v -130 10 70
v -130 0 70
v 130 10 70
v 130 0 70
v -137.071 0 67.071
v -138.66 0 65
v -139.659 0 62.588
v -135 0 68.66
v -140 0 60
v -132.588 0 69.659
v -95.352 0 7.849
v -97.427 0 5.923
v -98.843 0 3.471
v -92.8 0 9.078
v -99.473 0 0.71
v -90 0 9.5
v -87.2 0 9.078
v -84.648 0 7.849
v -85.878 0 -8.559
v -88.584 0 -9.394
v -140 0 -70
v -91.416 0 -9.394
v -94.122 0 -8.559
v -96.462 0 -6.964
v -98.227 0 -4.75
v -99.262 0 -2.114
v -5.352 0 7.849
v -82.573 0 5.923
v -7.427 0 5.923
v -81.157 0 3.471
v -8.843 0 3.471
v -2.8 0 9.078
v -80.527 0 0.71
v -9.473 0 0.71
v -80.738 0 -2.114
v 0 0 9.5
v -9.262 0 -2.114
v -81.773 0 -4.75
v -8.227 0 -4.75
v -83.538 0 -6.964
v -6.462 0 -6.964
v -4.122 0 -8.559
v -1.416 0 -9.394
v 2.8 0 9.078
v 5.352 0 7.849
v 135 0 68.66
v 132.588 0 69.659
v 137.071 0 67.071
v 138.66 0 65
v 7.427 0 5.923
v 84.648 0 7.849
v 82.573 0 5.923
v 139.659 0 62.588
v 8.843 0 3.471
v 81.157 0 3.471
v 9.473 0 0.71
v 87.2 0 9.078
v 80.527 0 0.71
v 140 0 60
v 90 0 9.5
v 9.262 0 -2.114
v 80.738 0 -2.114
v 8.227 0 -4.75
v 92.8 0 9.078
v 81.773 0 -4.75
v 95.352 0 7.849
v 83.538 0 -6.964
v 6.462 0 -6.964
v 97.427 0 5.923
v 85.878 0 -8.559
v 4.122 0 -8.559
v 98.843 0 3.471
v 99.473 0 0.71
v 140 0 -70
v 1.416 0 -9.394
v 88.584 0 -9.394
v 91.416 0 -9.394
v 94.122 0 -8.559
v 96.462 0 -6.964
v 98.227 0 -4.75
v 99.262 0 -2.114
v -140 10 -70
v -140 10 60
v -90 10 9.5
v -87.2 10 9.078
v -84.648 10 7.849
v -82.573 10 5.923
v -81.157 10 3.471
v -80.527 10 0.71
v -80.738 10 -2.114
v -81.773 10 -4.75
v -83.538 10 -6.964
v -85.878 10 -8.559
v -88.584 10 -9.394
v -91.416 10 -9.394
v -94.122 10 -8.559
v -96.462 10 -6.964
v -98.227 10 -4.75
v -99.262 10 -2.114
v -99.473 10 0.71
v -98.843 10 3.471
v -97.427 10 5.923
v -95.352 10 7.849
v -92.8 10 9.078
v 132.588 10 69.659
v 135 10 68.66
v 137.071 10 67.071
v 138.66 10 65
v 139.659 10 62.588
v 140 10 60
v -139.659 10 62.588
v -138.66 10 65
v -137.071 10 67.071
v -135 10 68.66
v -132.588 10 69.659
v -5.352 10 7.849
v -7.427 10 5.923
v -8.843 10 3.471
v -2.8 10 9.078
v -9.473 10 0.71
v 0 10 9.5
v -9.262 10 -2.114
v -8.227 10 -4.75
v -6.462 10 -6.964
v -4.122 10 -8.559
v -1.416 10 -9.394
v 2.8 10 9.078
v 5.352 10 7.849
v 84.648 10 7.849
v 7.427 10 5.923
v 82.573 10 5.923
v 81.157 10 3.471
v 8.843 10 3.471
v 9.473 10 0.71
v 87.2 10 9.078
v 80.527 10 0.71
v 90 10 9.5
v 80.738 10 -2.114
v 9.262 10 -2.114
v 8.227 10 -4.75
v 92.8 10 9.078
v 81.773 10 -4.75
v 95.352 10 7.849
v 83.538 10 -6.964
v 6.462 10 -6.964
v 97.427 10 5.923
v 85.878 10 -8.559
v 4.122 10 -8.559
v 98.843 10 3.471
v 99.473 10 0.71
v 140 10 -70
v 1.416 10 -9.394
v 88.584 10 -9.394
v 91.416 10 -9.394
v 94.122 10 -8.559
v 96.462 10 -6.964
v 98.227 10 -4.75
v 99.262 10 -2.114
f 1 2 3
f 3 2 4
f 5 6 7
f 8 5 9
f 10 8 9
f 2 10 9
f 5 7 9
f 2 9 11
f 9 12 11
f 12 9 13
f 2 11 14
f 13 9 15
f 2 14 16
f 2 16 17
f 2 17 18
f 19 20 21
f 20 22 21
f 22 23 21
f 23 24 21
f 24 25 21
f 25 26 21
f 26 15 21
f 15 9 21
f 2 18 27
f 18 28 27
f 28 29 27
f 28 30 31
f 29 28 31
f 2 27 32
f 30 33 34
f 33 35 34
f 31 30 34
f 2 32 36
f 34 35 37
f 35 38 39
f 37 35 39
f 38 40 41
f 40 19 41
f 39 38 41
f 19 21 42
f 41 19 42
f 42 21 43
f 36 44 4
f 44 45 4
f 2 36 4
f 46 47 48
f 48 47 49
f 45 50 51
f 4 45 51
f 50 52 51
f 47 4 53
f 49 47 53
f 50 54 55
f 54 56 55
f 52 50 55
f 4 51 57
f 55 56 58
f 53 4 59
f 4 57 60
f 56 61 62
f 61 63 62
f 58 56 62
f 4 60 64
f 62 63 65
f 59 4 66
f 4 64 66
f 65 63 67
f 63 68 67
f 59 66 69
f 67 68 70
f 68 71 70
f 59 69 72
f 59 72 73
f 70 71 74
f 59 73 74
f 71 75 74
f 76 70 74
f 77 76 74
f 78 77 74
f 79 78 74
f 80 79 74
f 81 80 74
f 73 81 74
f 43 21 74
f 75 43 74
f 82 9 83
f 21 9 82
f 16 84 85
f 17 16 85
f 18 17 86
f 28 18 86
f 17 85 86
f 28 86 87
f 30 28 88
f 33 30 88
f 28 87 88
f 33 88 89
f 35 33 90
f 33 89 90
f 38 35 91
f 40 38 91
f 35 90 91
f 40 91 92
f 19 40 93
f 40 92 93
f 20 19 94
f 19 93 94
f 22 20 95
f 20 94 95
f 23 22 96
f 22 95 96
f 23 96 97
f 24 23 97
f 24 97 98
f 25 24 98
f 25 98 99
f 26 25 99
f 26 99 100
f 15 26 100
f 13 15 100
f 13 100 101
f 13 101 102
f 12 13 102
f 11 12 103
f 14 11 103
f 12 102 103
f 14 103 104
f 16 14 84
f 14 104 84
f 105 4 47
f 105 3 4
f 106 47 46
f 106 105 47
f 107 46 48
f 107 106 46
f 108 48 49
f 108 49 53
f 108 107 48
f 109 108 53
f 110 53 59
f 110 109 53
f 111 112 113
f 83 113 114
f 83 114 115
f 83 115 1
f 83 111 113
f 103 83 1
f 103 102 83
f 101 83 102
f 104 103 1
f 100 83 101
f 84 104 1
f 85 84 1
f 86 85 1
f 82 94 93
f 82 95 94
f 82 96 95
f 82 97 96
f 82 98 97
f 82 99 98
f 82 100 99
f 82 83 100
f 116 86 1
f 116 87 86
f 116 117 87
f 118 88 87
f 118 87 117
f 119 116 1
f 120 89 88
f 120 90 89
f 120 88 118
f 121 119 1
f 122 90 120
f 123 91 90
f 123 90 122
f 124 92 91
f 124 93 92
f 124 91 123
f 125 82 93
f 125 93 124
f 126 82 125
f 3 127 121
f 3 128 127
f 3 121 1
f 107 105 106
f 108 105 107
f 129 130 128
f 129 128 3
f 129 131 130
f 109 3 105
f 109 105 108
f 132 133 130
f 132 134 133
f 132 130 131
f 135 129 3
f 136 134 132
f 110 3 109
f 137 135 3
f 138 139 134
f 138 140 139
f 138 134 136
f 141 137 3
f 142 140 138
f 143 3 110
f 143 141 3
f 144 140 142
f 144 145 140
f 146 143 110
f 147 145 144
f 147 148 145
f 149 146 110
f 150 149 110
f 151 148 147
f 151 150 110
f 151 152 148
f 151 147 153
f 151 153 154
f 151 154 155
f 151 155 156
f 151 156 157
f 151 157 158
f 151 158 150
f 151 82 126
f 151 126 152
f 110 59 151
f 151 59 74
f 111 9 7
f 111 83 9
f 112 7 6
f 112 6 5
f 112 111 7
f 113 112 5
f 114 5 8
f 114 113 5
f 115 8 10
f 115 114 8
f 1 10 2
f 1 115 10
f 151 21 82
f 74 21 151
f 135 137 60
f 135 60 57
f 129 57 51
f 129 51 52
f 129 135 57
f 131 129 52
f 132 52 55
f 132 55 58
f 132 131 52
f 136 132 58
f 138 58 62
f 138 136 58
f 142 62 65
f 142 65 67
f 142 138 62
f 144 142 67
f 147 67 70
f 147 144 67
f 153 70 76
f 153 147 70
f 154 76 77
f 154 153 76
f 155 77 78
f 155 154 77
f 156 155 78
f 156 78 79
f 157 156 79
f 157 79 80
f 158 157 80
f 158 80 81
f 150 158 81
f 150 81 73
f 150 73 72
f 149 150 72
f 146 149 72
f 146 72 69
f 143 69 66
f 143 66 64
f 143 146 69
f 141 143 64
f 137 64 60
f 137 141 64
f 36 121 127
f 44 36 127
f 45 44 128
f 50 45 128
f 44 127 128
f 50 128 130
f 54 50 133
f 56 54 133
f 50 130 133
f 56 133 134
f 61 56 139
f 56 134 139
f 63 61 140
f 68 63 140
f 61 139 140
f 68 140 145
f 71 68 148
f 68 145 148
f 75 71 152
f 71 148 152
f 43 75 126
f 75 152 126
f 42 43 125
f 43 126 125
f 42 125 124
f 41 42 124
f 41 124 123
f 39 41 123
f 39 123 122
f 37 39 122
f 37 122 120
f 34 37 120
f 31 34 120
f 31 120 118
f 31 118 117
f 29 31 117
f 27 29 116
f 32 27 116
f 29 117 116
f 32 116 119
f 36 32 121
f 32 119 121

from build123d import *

# Parameters (mm, degrees)
SKETCH1_W           = 280
SKETCH1_H           = 140
BOSS_EXTRUDE1_DEPTH = 10
SKETCH2_R           = 9.5
CUT_EXTRUDE1_DEPTH  = 10
FILLET1_R           = 10


with BuildPart() as part:
    # Sketch1 → Boss-Extrude1 (new body)
    with BuildSketch(Plane(origin=(0, 0, 0), x_dir=(1, 0, 0), z_dir=(0, 1, 0))):
        Rectangle(SKETCH1_W, SKETCH1_H)
    extrude(amount=BOSS_EXTRUDE1_DEPTH)

    # Sketch2 → Cut-Extrude1 (cut)
    with BuildSketch(Plane(origin=(0, 10, 0), x_dir=(1, 0, 0), z_dir=(0, 1, 0))):
        with Locations(Location((-90, 0, 0), (0, 0, 270))):
            Circle(SKETCH2_R)
        with Locations(Location((0, 0, 0), (0, 0, 270))):
            Circle(SKETCH2_R)
    cut_extrude1 = extrude(amount=-CUT_EXTRUDE1_DEPTH, mode=Mode.SUBTRACT)

    # Mirror1: Cut-Extrude1 across plane
    add(cut_extrude1.mirror(Plane(origin=(0, 0, 0), x_dir=(0, 0, 1), z_dir=(1, 0, 0))), mode=Mode.SUBTRACT)

    # Fillet1
    fillet1_edges = [part.edges().sort_by_distance(p)[0] for p in [
        (140, 5, 70),
        (-140, 5, 70),
    ]]
    fillet(fillet1_edges, radius=FILLET1_R)


solid = part.part
